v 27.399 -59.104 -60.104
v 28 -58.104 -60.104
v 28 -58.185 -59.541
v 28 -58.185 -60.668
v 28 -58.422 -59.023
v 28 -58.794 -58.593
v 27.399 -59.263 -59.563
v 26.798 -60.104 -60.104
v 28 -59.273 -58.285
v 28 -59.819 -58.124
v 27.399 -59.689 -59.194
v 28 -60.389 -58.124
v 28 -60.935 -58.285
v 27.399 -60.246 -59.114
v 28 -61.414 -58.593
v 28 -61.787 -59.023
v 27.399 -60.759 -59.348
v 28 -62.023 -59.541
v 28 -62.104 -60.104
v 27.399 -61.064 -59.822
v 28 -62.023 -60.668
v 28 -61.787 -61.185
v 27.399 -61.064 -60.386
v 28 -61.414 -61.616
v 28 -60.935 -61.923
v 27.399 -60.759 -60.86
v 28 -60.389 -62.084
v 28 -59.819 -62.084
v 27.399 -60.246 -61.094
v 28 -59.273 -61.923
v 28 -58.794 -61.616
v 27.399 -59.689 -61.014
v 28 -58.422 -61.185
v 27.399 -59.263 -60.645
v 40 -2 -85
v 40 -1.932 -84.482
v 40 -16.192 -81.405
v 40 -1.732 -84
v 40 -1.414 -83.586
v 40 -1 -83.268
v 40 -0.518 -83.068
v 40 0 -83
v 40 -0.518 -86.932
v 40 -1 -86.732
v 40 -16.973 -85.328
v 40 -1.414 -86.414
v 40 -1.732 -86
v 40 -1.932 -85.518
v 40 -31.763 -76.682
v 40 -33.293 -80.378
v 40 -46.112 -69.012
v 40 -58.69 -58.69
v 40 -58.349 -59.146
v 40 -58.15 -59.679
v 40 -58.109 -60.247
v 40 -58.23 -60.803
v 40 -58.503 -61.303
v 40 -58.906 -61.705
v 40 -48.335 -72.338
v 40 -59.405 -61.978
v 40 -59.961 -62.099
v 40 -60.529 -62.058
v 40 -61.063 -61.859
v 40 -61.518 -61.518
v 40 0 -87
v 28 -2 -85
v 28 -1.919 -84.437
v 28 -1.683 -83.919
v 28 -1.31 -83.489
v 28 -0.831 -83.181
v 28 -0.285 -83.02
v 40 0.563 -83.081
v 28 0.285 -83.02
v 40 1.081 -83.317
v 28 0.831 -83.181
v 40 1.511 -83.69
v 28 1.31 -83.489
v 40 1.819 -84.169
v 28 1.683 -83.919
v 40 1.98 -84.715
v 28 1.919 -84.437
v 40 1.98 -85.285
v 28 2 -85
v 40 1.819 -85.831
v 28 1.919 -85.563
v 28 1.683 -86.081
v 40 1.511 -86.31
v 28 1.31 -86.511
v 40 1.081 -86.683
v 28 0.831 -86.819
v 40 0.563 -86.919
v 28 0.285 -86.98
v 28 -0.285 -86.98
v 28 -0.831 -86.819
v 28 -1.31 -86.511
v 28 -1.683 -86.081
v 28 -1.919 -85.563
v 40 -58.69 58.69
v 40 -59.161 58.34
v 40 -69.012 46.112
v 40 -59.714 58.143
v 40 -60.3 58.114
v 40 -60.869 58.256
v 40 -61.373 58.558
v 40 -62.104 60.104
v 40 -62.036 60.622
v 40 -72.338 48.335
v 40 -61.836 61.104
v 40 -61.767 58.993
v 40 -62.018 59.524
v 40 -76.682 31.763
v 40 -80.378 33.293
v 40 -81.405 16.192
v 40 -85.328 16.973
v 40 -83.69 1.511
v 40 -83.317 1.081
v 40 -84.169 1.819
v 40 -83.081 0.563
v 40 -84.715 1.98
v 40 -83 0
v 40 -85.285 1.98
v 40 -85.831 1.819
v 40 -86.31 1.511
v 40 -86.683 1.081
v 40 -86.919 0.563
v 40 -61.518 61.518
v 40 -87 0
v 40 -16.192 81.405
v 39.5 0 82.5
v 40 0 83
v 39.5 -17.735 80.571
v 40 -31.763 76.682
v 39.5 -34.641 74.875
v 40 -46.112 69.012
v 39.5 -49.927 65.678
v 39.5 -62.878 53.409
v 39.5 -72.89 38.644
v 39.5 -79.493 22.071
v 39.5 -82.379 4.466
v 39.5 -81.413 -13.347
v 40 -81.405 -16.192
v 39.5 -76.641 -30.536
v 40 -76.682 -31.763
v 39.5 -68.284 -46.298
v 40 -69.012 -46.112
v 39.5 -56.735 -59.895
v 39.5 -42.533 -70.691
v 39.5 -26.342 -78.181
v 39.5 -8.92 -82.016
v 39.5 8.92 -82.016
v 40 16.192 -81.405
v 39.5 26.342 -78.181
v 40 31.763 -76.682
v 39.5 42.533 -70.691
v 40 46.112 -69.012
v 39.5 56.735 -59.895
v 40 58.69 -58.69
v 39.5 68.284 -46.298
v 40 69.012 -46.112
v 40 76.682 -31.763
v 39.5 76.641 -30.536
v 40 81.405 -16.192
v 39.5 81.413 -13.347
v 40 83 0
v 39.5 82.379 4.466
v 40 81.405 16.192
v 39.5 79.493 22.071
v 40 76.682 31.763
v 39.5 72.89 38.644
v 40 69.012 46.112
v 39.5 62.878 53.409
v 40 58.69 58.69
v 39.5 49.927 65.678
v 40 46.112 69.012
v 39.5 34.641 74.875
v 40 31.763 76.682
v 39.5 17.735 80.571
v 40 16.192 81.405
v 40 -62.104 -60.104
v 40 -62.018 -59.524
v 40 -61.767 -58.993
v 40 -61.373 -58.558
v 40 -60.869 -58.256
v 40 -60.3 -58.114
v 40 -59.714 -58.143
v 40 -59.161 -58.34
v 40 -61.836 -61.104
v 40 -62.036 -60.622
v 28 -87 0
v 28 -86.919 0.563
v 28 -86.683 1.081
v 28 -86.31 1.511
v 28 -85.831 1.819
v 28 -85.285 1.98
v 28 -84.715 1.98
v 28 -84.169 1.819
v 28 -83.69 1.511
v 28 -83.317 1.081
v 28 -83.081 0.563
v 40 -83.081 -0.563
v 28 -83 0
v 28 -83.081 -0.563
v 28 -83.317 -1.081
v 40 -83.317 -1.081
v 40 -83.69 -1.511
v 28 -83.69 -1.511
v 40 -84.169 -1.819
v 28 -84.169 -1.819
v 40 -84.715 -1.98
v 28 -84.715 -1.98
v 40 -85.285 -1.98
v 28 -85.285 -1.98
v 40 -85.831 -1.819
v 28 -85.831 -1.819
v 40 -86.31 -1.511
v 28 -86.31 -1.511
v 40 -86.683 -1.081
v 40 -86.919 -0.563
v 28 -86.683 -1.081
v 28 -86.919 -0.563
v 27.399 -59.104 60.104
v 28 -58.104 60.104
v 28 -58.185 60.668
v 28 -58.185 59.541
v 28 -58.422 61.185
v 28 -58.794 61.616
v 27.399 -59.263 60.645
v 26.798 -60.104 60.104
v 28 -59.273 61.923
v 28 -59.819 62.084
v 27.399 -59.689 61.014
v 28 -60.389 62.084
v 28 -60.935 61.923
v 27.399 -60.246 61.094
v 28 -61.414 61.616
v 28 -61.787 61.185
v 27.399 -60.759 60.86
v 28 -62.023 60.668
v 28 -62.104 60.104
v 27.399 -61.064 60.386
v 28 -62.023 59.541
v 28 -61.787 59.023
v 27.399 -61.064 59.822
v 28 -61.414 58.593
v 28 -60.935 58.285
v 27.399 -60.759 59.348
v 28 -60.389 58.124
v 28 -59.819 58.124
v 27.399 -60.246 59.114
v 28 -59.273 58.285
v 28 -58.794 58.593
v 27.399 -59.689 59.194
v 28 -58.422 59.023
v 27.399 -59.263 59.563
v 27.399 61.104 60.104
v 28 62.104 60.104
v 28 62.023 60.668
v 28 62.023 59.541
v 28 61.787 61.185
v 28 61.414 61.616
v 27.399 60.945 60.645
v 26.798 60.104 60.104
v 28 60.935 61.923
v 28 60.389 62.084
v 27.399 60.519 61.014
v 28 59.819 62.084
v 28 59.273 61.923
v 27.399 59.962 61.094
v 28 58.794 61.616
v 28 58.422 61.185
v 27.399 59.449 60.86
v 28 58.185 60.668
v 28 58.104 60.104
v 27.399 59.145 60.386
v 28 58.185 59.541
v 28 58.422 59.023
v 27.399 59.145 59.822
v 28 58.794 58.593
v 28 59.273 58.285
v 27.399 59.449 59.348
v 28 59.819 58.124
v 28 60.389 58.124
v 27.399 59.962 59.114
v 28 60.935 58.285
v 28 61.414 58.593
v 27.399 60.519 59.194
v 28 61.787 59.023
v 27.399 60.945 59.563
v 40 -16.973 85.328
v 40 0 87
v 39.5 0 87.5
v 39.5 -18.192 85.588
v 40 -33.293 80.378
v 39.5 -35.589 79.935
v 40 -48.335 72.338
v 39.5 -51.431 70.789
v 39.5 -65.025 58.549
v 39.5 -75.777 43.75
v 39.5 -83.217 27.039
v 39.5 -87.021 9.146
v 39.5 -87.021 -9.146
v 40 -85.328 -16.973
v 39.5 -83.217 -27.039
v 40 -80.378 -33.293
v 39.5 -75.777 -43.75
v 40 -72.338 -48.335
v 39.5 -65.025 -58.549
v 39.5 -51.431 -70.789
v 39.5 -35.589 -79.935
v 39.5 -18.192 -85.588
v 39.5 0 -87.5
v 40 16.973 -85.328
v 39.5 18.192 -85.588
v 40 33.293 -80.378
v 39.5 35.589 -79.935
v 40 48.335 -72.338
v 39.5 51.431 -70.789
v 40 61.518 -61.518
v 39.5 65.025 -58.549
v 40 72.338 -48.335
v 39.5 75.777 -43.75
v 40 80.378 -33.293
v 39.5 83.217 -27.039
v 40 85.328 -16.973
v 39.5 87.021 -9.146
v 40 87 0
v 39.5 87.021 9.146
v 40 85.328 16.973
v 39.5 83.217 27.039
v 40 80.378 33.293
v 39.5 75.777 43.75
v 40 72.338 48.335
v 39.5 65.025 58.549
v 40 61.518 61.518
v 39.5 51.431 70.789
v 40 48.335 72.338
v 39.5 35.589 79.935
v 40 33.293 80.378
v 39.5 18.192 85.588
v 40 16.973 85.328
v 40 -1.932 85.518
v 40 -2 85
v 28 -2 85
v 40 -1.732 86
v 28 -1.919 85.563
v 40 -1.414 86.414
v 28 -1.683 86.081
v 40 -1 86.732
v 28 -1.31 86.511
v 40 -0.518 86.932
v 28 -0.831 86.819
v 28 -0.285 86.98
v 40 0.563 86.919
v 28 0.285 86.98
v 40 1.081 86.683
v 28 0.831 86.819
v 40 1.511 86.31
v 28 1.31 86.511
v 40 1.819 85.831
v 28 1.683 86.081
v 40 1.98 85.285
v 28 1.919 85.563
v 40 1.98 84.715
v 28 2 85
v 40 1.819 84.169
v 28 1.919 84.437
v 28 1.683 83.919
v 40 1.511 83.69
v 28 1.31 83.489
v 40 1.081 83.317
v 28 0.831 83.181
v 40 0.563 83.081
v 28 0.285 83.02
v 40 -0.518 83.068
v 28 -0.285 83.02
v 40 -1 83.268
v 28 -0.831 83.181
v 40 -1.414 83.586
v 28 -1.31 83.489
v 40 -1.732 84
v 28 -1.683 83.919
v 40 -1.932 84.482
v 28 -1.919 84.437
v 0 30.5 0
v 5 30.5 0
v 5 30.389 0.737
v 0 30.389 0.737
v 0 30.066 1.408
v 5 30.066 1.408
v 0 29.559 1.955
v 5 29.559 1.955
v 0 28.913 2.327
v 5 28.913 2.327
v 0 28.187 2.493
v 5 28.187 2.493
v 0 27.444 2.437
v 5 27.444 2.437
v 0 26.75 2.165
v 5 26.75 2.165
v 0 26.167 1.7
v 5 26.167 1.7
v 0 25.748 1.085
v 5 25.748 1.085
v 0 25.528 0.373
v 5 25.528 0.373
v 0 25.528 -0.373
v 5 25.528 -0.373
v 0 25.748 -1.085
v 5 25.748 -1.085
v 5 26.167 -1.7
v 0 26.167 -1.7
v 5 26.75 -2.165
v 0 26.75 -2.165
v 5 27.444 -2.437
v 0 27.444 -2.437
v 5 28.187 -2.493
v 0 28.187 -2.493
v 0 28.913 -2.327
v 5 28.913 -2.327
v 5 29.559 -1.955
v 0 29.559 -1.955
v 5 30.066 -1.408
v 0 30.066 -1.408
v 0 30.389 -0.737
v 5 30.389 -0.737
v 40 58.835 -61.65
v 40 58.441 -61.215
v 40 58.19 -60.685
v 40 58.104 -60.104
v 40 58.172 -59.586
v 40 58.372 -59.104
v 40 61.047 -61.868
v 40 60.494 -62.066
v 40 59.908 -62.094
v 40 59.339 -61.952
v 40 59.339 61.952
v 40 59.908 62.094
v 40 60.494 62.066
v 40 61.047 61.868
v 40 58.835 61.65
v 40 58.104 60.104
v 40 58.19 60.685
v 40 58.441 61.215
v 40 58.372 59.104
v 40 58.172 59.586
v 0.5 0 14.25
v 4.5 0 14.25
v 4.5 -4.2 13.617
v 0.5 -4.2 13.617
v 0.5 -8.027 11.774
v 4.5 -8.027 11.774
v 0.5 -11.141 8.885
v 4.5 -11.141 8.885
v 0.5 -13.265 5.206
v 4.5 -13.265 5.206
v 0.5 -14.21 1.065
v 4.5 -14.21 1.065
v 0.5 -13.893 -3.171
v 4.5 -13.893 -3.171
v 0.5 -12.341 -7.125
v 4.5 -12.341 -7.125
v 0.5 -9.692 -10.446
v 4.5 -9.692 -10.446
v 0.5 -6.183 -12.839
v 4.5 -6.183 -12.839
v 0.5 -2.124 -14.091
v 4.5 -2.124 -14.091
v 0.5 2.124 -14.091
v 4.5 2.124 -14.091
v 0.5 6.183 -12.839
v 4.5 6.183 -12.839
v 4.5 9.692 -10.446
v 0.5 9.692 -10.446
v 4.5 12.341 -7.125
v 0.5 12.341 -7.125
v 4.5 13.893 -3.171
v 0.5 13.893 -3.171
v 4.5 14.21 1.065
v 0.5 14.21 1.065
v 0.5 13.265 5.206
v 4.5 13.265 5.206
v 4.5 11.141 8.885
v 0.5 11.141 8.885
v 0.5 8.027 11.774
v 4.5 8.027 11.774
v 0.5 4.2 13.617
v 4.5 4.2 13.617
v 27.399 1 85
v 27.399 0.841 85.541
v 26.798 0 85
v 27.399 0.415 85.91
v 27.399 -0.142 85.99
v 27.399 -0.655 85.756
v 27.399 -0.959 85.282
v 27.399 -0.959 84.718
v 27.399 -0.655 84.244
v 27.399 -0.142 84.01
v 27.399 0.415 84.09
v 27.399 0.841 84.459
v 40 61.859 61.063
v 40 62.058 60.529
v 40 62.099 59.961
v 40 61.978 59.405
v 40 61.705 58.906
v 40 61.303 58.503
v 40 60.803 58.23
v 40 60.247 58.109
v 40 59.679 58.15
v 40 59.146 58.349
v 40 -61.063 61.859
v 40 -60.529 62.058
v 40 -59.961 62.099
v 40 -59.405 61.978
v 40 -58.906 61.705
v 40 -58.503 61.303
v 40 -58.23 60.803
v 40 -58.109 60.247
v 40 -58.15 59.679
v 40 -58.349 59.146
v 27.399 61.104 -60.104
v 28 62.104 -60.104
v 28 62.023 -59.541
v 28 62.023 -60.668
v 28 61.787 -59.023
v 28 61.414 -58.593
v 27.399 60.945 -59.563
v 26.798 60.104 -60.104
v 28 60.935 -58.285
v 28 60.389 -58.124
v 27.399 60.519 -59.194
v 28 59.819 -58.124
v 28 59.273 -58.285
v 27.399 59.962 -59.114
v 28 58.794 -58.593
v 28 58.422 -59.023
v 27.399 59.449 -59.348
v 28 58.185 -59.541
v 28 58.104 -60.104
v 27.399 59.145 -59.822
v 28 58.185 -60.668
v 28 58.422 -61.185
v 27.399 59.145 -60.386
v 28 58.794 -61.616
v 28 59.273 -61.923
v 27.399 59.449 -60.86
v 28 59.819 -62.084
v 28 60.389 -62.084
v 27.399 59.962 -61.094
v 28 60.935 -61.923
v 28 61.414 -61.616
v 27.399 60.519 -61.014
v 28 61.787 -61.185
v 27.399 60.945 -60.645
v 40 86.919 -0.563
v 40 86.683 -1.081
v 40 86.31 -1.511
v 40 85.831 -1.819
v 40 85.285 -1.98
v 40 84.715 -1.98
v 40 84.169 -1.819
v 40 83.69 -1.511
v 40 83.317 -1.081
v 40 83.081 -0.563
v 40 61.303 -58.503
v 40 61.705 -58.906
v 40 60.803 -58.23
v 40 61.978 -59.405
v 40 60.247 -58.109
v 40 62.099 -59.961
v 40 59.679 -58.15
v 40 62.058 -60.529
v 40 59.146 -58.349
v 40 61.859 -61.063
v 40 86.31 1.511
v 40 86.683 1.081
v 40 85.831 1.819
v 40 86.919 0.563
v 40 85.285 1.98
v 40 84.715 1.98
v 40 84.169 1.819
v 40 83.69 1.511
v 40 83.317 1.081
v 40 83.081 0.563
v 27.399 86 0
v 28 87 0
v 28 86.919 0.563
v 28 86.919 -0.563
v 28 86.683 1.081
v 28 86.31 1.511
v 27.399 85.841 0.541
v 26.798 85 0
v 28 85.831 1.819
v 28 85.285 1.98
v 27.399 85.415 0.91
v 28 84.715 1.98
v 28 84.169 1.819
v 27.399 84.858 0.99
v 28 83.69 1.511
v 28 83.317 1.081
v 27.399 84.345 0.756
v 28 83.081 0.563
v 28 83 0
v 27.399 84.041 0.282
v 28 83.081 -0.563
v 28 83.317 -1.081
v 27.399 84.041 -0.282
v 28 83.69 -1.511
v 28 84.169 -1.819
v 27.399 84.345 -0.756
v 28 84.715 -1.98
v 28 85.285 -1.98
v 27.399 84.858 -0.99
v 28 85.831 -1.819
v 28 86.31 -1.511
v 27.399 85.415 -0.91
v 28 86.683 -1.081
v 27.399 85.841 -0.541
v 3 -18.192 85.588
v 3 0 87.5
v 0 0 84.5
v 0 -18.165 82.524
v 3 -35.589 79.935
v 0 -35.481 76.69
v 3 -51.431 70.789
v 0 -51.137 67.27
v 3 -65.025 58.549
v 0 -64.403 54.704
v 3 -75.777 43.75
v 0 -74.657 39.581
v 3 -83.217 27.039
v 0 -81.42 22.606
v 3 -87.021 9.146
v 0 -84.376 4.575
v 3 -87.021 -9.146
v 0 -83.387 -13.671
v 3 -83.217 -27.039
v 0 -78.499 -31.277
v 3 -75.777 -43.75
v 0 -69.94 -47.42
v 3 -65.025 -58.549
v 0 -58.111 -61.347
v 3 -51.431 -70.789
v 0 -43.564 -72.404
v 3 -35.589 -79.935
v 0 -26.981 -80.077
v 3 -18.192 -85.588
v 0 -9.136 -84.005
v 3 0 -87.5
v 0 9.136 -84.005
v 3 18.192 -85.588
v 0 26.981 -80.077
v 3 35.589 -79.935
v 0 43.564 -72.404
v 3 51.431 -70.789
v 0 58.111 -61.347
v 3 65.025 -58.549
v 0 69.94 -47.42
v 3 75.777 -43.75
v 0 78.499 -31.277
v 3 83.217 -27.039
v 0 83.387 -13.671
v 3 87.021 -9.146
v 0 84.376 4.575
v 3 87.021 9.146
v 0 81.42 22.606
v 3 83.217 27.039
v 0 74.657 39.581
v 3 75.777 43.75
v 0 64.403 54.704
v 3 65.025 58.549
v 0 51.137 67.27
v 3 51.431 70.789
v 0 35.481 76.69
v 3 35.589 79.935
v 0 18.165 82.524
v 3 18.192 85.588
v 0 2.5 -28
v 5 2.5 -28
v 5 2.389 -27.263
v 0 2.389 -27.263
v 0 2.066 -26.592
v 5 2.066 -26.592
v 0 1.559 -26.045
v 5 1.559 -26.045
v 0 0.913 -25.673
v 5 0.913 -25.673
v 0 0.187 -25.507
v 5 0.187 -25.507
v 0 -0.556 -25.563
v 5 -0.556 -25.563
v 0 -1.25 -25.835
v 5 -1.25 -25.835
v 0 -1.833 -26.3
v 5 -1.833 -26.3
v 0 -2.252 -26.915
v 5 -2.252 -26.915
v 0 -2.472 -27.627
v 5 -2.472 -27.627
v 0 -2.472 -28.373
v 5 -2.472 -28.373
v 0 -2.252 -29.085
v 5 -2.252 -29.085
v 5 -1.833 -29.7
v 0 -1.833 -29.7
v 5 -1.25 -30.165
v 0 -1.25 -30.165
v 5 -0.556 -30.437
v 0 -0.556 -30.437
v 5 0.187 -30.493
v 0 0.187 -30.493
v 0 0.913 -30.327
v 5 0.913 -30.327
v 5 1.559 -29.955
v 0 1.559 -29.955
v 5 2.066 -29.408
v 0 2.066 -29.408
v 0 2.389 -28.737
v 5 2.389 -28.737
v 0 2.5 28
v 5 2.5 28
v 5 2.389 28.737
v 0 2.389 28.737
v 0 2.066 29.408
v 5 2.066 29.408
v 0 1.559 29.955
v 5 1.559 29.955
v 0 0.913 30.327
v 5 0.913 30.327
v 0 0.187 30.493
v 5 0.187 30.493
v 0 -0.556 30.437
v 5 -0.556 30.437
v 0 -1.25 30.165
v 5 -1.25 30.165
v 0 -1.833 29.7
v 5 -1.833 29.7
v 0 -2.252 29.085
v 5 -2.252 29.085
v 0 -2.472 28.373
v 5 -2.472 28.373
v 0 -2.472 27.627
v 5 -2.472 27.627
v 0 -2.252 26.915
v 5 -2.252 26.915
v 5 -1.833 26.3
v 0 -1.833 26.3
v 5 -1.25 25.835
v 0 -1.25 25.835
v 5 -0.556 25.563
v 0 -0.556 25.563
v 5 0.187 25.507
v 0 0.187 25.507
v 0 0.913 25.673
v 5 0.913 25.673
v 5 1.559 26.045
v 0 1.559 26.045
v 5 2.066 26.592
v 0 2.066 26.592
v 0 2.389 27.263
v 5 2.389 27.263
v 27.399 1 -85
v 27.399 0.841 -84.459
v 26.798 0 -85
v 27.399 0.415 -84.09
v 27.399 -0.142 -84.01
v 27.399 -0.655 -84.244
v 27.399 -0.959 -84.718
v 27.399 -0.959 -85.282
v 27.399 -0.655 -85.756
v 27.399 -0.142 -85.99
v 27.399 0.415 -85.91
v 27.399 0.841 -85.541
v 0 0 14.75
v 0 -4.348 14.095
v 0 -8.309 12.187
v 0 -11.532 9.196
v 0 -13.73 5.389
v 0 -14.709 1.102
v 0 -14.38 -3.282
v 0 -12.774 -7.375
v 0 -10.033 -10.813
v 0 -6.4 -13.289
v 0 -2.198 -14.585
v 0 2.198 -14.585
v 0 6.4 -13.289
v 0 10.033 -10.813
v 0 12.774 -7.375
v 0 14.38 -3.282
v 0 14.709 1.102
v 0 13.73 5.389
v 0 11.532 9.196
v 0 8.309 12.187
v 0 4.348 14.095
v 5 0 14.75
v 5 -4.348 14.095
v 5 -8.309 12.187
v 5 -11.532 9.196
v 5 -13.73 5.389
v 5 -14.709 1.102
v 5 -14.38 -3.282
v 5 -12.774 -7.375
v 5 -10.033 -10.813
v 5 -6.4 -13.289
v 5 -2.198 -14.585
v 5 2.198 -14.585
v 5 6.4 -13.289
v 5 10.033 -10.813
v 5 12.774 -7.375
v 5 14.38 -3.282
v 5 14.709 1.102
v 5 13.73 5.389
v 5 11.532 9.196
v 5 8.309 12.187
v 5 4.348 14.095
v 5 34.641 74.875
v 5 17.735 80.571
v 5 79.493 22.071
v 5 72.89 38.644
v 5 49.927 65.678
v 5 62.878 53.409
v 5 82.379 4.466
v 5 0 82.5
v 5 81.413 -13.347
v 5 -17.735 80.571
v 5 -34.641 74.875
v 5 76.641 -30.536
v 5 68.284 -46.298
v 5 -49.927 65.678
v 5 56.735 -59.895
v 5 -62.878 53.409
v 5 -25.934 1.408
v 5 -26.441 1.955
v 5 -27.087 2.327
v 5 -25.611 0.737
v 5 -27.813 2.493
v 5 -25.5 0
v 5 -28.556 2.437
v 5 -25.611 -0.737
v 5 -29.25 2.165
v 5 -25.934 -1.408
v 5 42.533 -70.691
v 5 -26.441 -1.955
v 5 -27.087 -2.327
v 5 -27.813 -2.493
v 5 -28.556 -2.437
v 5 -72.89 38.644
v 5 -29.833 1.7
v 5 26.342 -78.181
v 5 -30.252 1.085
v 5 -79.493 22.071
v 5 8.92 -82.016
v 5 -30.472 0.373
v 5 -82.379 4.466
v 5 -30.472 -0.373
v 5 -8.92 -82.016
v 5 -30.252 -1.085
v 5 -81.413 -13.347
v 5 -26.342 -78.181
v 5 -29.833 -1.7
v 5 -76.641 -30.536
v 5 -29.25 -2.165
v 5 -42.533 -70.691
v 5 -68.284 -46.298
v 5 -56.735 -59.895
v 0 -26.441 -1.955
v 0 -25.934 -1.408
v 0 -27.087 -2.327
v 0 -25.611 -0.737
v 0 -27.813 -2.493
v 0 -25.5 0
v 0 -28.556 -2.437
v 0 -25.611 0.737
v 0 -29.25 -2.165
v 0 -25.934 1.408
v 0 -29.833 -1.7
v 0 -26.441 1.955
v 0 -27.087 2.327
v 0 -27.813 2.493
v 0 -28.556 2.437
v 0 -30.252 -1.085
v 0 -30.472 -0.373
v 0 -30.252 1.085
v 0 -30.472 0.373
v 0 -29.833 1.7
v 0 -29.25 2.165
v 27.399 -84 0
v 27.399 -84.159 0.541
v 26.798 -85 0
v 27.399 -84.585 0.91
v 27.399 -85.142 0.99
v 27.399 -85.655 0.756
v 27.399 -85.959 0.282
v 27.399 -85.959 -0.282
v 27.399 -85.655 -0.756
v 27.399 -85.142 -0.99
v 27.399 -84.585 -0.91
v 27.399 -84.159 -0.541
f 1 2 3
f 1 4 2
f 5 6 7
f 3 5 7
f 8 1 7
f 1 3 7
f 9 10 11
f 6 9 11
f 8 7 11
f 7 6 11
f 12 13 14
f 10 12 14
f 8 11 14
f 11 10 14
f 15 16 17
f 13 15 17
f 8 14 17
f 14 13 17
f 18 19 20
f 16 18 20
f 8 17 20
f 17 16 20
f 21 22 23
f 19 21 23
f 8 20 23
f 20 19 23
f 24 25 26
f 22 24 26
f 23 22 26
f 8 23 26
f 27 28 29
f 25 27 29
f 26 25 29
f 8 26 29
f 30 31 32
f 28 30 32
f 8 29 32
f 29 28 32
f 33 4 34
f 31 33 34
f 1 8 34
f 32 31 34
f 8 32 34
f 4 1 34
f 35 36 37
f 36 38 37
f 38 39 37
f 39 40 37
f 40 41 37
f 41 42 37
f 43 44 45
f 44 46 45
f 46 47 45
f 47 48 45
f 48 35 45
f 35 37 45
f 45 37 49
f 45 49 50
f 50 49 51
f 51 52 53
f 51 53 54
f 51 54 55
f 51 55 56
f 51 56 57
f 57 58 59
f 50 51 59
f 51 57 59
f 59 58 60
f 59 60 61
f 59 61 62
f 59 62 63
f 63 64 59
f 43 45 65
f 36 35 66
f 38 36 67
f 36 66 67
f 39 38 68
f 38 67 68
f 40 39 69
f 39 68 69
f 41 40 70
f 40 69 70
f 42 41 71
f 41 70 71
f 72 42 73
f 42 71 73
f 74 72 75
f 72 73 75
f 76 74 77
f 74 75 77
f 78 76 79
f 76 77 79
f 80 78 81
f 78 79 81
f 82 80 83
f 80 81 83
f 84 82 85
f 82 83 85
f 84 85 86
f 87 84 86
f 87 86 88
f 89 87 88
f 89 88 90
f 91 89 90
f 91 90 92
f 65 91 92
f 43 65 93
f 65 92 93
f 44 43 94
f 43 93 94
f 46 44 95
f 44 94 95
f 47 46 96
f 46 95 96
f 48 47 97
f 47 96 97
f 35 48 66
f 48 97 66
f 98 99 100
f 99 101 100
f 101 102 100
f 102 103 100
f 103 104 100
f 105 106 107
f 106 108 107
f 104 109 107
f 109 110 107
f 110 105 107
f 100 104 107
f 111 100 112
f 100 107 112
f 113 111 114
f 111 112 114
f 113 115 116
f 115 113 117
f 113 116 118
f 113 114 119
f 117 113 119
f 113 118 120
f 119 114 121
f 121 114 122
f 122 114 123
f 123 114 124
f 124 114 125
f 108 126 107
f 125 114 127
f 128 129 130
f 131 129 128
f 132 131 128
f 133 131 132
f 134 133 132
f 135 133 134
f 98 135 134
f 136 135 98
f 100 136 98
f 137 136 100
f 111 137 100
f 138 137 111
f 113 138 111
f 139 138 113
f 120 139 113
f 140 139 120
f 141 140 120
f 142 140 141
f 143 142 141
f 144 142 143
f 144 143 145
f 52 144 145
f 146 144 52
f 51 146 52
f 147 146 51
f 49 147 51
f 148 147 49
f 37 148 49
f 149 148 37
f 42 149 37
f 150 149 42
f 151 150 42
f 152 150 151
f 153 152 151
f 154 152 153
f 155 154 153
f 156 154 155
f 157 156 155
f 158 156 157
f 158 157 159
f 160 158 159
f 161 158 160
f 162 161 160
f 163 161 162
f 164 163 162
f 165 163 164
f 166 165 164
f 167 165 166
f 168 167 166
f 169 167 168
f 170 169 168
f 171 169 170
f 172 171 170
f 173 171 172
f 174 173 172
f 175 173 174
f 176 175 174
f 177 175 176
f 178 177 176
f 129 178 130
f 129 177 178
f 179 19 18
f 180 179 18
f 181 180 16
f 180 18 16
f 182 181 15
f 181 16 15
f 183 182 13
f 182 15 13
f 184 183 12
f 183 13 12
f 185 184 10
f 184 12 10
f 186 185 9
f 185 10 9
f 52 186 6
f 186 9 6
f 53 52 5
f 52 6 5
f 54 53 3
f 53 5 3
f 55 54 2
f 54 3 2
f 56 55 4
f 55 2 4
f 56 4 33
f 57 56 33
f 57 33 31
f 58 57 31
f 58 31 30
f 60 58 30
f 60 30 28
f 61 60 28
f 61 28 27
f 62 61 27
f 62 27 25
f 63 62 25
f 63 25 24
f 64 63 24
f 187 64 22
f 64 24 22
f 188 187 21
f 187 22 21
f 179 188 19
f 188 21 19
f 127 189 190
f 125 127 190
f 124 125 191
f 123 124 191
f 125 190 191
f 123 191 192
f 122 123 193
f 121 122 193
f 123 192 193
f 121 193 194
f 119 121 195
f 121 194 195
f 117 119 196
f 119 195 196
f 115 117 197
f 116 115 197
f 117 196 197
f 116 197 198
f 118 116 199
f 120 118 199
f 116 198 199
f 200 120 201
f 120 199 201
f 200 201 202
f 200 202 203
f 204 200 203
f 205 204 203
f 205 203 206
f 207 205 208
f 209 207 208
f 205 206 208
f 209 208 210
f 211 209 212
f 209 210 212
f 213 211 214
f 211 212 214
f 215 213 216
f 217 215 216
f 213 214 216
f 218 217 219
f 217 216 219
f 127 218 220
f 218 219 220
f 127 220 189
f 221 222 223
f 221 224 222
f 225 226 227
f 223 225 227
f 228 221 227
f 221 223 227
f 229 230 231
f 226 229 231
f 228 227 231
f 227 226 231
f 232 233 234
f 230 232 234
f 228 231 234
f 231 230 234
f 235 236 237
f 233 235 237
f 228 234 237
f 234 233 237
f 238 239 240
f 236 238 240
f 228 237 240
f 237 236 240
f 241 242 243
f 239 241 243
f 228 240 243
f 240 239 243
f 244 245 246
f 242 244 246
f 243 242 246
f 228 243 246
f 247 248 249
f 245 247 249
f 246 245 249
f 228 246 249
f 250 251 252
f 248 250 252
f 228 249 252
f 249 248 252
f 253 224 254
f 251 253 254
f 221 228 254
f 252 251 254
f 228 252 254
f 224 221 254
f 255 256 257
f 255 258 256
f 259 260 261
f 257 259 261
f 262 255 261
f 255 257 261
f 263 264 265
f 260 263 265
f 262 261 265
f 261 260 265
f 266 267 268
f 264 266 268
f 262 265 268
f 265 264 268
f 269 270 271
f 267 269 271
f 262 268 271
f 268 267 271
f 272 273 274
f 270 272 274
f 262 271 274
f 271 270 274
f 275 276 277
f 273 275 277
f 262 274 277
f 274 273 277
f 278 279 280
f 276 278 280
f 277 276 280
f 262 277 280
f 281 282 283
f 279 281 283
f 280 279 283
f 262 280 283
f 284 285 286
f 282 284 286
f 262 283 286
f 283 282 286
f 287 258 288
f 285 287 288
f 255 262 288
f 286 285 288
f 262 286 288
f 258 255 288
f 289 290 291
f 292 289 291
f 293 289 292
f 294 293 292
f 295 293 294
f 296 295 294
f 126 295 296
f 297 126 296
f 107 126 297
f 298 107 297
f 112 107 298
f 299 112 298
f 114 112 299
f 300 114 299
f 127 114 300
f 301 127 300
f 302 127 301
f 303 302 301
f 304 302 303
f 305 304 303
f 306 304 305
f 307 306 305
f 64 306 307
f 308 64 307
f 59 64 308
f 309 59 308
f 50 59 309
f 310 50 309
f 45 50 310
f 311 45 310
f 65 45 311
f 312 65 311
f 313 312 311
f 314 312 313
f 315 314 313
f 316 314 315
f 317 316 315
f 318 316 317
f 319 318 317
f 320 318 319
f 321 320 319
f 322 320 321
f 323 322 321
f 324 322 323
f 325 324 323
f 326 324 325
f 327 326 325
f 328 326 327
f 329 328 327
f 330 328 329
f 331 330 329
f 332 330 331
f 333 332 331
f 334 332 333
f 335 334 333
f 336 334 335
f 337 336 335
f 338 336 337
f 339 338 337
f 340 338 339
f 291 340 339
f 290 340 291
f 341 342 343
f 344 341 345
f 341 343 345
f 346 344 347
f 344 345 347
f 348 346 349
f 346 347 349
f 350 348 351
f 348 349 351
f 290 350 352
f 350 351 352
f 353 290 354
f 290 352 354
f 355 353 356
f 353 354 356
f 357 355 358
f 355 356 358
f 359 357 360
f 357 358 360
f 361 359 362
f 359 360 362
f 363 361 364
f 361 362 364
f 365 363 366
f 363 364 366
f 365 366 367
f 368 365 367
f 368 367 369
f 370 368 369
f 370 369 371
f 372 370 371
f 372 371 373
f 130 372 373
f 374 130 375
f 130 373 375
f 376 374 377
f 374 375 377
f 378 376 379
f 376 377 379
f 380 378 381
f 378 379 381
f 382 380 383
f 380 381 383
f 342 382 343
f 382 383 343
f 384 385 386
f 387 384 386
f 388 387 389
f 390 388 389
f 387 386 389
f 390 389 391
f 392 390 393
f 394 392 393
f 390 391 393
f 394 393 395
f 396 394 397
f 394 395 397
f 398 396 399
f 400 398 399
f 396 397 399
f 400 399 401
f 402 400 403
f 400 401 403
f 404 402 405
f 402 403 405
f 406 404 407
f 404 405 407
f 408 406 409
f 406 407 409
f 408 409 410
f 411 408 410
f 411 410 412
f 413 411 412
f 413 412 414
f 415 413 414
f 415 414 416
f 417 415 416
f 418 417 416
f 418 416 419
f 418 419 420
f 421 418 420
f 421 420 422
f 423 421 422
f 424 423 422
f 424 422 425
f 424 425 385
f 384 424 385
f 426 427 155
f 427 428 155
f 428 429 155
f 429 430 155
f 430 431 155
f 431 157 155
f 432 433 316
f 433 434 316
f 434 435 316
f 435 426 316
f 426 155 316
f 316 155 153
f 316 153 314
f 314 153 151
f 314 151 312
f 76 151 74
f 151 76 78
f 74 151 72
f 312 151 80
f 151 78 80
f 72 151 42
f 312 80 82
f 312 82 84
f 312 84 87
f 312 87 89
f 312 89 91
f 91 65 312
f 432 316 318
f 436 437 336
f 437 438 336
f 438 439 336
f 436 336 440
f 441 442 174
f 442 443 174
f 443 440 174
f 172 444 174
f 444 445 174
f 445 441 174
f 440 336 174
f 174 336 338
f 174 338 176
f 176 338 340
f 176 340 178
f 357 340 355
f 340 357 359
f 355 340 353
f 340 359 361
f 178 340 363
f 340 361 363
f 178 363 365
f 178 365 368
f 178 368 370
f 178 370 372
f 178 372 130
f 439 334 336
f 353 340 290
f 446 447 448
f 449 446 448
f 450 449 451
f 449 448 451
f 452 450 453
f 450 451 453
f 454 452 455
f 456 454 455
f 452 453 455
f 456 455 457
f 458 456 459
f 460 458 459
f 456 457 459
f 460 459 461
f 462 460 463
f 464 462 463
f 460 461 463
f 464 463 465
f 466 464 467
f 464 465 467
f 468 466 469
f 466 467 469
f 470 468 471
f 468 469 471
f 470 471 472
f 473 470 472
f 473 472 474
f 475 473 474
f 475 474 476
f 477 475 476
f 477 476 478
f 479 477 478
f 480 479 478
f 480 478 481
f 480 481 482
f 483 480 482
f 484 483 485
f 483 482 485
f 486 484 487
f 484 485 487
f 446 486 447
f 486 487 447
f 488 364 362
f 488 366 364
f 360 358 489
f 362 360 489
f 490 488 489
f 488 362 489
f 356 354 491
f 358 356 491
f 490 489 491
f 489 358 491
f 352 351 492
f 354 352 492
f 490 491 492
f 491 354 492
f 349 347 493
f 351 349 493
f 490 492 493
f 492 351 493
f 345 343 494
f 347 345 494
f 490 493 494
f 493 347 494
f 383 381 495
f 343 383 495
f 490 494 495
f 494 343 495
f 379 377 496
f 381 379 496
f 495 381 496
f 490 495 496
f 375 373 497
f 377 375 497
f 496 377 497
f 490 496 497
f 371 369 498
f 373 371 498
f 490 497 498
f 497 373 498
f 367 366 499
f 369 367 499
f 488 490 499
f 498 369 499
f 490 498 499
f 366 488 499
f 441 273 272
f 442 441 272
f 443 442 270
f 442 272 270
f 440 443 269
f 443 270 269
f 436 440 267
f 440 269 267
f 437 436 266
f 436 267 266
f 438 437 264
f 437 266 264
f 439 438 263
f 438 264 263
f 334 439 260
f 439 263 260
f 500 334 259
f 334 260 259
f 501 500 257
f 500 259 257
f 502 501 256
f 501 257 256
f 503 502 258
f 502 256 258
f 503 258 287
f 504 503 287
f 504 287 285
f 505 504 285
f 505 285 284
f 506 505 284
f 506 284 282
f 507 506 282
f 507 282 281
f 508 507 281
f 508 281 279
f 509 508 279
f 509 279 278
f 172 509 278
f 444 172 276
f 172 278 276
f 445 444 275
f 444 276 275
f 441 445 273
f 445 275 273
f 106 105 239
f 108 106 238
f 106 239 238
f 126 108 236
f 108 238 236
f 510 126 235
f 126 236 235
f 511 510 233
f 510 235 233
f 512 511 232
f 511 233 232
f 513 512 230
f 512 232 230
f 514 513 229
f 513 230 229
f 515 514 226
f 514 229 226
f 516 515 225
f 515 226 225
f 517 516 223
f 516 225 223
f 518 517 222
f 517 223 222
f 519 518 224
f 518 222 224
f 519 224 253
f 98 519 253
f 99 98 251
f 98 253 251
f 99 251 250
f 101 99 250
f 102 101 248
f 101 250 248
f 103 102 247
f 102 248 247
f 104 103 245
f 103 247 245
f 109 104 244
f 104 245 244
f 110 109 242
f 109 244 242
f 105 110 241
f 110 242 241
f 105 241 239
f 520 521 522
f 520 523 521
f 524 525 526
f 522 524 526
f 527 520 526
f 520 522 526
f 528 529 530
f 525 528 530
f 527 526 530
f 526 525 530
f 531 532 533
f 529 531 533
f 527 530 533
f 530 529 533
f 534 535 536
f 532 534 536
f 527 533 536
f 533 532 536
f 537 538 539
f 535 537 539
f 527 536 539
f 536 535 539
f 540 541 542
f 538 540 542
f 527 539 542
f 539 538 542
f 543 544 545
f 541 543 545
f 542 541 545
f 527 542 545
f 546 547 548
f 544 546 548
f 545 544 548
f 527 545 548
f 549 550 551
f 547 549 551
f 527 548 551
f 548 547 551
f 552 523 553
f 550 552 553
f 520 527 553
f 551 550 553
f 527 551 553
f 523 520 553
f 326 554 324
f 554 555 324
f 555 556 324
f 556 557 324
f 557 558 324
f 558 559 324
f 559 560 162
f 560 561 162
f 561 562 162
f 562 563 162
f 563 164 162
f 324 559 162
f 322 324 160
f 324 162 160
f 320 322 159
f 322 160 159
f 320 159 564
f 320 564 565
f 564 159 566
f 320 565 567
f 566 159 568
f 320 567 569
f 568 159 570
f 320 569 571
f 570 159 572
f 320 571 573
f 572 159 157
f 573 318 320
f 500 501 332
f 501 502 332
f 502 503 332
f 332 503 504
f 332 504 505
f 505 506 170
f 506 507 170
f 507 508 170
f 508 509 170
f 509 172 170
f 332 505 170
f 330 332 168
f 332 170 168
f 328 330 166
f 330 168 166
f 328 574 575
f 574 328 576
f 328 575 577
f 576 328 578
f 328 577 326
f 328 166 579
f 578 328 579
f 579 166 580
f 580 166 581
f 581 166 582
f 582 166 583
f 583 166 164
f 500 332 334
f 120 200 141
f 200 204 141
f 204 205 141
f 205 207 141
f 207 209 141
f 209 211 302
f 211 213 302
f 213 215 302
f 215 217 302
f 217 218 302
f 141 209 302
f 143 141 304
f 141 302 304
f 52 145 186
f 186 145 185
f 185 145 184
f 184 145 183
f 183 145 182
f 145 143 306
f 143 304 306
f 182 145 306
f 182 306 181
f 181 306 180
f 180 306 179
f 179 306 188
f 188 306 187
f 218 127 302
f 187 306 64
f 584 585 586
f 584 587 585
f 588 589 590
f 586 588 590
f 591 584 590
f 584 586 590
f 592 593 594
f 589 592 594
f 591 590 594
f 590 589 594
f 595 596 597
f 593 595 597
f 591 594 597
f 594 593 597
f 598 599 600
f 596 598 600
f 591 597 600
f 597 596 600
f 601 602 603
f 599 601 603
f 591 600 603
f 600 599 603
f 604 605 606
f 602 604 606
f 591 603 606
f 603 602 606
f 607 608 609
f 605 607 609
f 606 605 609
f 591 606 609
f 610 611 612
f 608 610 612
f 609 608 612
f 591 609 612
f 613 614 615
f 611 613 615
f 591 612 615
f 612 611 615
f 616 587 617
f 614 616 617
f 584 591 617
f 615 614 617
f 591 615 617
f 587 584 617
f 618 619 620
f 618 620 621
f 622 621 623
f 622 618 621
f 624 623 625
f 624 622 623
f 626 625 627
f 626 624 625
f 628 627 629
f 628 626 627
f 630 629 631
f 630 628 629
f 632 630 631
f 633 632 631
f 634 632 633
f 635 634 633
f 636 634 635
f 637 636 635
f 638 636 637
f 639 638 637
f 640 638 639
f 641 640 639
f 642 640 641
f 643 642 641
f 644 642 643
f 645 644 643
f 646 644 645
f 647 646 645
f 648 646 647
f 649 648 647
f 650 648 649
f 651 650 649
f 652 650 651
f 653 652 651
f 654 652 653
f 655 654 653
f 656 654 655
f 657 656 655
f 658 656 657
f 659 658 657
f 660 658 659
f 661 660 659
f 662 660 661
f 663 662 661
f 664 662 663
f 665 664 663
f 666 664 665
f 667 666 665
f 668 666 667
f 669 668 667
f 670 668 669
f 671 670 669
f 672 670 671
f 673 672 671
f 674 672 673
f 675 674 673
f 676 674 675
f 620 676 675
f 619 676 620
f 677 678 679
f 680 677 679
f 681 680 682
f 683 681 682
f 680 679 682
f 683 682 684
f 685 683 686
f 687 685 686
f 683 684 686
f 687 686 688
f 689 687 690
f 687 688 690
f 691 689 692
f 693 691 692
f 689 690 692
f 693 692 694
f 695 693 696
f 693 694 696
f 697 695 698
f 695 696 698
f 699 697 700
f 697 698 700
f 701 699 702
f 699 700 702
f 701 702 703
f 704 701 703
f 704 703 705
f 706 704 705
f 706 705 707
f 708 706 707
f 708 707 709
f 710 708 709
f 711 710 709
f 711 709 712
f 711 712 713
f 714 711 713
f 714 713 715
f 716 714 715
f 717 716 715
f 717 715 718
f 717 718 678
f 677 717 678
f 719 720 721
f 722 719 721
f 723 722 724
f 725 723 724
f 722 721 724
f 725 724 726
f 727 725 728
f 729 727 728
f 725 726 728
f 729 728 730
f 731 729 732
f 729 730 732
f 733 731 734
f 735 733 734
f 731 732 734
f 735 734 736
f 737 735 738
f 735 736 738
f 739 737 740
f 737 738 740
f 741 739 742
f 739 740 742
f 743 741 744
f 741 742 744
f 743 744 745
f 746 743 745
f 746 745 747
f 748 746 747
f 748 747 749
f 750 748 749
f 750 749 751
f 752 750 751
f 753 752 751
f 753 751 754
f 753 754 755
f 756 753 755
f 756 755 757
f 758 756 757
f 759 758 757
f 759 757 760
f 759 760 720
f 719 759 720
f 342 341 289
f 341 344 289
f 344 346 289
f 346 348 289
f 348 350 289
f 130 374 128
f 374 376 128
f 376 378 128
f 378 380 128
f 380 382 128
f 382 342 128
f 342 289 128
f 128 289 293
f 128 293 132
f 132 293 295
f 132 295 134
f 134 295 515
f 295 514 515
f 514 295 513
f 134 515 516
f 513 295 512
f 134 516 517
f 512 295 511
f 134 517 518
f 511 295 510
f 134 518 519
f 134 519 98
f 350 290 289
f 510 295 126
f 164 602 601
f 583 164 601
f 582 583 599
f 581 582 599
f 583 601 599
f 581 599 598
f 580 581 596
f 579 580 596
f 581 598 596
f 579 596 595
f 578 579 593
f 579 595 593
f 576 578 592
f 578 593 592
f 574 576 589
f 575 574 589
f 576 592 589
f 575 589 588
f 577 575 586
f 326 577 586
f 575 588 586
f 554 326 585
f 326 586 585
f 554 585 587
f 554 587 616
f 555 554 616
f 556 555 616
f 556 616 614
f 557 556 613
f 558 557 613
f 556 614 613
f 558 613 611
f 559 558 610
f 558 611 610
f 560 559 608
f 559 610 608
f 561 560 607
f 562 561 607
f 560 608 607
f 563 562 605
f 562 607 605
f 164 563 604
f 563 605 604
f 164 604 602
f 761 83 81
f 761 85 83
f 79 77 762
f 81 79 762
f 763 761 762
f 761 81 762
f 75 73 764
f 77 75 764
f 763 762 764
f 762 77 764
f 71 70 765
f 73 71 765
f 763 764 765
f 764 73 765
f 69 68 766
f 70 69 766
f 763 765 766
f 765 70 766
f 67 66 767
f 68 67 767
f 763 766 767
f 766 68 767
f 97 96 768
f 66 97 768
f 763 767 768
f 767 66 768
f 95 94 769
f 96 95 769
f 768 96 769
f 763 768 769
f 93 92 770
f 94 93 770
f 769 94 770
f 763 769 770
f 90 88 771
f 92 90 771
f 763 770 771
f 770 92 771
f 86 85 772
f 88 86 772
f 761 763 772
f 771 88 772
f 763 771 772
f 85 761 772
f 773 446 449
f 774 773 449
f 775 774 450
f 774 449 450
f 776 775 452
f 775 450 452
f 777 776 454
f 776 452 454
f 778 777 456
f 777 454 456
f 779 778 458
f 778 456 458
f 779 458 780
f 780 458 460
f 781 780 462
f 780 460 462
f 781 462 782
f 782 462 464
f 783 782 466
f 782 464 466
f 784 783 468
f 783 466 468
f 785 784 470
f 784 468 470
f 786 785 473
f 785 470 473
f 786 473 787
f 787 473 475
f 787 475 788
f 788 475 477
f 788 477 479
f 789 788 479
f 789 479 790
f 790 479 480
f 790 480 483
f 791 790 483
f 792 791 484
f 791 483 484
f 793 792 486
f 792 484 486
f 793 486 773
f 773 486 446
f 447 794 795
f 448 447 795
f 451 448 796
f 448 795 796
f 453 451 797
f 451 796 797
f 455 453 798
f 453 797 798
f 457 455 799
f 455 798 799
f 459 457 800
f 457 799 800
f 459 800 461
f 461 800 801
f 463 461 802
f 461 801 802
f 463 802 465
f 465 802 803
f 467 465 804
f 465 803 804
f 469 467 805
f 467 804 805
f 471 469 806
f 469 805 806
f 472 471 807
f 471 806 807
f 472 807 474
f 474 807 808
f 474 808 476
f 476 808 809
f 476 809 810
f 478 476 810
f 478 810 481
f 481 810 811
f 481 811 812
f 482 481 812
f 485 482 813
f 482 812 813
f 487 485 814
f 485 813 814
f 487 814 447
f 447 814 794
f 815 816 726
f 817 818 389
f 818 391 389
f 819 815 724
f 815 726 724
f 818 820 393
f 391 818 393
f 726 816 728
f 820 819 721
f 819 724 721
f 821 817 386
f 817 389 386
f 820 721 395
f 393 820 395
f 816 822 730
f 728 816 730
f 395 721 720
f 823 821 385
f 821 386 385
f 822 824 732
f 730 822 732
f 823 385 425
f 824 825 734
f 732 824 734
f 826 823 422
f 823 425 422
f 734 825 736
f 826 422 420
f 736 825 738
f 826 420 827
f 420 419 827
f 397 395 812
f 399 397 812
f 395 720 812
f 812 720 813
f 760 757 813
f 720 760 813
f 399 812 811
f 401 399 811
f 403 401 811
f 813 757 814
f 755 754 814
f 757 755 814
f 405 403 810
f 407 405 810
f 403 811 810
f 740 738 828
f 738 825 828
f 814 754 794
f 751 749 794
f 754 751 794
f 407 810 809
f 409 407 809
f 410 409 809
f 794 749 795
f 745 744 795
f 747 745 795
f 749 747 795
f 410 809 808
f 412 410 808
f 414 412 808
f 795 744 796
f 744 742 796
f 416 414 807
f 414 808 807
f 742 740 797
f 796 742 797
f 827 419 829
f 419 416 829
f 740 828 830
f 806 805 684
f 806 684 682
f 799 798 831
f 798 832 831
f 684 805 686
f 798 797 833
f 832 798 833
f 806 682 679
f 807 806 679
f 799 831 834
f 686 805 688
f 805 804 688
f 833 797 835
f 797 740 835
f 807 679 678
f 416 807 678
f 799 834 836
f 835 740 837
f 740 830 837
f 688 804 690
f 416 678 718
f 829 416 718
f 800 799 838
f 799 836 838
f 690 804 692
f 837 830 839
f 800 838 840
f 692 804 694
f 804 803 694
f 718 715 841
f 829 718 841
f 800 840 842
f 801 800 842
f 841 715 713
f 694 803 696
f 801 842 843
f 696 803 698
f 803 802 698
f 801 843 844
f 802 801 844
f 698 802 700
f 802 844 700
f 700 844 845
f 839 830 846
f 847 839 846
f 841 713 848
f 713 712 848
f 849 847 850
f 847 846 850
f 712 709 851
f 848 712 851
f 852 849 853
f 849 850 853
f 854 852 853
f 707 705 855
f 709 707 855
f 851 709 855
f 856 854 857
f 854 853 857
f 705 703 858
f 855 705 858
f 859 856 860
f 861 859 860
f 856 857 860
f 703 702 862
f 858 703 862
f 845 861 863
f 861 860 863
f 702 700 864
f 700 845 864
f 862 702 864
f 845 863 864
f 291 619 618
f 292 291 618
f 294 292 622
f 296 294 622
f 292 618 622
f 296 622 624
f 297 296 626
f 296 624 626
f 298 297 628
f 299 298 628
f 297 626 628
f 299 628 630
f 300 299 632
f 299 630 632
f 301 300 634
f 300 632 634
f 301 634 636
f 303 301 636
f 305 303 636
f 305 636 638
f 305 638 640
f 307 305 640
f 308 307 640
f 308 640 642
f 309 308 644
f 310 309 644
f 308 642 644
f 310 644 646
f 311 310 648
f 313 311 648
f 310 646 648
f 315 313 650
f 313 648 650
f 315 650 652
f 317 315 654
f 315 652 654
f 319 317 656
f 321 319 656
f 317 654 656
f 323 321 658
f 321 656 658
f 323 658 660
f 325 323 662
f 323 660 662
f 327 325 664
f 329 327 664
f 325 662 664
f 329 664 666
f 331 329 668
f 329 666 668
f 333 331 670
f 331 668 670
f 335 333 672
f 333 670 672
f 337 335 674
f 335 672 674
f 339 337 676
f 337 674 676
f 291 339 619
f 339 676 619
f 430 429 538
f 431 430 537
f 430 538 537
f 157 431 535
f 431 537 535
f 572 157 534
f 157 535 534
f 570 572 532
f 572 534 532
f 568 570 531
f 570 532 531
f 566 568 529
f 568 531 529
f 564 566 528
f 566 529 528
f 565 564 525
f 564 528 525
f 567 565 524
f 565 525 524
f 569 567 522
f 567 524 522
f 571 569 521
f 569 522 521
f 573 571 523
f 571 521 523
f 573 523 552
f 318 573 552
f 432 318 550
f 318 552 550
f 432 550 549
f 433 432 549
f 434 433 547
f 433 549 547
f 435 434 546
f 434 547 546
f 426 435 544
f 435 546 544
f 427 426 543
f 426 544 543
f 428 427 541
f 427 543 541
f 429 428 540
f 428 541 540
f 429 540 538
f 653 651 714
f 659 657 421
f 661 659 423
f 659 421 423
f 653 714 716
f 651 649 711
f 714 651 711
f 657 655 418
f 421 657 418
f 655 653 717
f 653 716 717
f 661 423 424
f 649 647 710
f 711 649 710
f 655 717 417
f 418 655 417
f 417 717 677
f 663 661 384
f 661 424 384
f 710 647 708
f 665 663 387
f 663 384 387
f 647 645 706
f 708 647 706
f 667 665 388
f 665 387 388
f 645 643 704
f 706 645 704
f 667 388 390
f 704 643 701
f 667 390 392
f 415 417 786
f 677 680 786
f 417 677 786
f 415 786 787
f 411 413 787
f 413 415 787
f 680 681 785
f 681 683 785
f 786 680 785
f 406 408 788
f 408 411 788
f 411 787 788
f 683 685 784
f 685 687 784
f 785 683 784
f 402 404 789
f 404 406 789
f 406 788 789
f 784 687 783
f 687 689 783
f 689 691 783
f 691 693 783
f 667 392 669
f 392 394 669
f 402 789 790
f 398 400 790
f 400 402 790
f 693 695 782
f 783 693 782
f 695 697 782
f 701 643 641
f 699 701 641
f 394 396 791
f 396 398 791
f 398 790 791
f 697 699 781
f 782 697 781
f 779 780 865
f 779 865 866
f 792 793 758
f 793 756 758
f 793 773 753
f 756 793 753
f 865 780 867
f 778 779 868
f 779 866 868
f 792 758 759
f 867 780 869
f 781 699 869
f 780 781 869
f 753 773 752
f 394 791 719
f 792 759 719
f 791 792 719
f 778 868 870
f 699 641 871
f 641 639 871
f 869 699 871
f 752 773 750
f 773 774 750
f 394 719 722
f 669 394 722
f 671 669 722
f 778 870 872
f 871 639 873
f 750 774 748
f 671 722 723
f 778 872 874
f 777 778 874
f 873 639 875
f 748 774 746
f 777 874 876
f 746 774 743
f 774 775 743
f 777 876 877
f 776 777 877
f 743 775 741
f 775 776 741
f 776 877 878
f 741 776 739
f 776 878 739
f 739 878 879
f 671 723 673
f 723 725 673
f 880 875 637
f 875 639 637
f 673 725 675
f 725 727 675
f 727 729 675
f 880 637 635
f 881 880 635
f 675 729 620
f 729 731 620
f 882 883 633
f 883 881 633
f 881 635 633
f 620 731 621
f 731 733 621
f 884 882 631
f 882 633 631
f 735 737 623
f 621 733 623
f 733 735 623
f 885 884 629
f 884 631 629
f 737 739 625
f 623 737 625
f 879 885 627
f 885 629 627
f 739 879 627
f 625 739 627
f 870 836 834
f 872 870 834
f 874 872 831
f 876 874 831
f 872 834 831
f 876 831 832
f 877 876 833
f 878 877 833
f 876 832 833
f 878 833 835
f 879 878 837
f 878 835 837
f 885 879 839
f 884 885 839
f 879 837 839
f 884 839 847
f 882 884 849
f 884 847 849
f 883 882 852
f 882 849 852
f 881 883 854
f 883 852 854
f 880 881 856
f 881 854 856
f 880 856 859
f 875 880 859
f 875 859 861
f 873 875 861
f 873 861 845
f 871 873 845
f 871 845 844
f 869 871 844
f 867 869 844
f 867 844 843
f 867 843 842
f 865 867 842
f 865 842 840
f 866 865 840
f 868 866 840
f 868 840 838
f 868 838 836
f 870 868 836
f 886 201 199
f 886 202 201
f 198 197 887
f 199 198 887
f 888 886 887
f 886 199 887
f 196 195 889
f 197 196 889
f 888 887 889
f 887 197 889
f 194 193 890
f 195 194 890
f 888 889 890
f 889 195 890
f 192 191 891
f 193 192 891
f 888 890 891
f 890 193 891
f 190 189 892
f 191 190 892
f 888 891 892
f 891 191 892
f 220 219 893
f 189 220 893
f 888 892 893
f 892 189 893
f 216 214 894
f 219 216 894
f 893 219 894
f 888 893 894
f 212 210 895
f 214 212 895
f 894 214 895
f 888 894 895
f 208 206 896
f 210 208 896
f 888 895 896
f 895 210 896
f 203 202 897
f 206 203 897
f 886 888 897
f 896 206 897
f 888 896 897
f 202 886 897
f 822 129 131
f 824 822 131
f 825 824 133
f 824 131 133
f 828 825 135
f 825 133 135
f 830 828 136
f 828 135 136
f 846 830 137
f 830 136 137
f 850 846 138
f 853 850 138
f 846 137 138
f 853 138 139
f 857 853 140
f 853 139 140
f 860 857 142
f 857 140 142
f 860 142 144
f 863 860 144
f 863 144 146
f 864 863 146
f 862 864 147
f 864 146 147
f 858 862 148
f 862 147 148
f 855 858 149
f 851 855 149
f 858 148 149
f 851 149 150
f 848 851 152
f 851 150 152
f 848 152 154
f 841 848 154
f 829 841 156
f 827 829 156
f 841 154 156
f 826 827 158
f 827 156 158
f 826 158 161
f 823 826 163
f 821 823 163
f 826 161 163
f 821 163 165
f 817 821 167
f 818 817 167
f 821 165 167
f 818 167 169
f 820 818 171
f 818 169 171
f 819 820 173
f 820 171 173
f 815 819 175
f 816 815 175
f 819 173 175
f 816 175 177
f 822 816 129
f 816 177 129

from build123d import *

# Parameters (mm, degrees)
F2_SIZE  = 3
F3_SIZE  = 0.5
F5_D     = 5
F7_D     = 4
F7_DEPTH = 12
F7_TIP   = 1.2017212381


with BuildPart() as f1:
    # F0 (on Front) → F1 (revolve)
    with BuildSketch(Plane.XZ):
        Polygon((0, 87.5), (0, 14.25), (5, 14.25), (5, 82.5), (40, 82.5), (40, 87.5), align=None)
    revolve(axis=Axis((15.7068069821, 0, 0), (1, 0, 0)))

    # F2
    f2_edges = [f1.edges().sort_by_distance(p)[0] for p in [
        (0, 0, -87.5),
    ]]
    chamfer(f2_edges, length=F2_SIZE)

    # F3
    f3_edges = [f1.edges().sort_by_distance(p)[0] for p in [
        (40, 0, -87.5),
        (40, 0, -82.5),
        (5, 0, -14.25),
        (0, 0, -14.25),
    ]]
    chamfer(f3_edges, length=F3_SIZE)

    # F5 (through all)
    with Locations(Plane(origin=(0, 0, 0), x_dir=(0, -1, 0), z_dir=(-1, 0, 0))):
        with Locations((0, 28), (-28, 0), (0, -28), (28, 0)):
            Hole(F5_D / 2)

    # F7
    with Locations(Plane.YZ.offset(40)):
        with Locations((0, 85), (-85, 0), (-60.1040764009, 60.1040764009), (-60.1040764009, -60.1040764009), (0, -85), (60.1040764009, -60.1040764009), (85, 0), (60.1040764009, 60.1040764009)):
            Hole(F7_D / 2, depth=F7_DEPTH)
            with Locations((0, 0, -(F7_DEPTH + F7_TIP / 2))):  # 118° drill point
                Cone(0, F7_D / 2, F7_TIP, mode=Mode.SUBTRACT)


solid = f1.part
